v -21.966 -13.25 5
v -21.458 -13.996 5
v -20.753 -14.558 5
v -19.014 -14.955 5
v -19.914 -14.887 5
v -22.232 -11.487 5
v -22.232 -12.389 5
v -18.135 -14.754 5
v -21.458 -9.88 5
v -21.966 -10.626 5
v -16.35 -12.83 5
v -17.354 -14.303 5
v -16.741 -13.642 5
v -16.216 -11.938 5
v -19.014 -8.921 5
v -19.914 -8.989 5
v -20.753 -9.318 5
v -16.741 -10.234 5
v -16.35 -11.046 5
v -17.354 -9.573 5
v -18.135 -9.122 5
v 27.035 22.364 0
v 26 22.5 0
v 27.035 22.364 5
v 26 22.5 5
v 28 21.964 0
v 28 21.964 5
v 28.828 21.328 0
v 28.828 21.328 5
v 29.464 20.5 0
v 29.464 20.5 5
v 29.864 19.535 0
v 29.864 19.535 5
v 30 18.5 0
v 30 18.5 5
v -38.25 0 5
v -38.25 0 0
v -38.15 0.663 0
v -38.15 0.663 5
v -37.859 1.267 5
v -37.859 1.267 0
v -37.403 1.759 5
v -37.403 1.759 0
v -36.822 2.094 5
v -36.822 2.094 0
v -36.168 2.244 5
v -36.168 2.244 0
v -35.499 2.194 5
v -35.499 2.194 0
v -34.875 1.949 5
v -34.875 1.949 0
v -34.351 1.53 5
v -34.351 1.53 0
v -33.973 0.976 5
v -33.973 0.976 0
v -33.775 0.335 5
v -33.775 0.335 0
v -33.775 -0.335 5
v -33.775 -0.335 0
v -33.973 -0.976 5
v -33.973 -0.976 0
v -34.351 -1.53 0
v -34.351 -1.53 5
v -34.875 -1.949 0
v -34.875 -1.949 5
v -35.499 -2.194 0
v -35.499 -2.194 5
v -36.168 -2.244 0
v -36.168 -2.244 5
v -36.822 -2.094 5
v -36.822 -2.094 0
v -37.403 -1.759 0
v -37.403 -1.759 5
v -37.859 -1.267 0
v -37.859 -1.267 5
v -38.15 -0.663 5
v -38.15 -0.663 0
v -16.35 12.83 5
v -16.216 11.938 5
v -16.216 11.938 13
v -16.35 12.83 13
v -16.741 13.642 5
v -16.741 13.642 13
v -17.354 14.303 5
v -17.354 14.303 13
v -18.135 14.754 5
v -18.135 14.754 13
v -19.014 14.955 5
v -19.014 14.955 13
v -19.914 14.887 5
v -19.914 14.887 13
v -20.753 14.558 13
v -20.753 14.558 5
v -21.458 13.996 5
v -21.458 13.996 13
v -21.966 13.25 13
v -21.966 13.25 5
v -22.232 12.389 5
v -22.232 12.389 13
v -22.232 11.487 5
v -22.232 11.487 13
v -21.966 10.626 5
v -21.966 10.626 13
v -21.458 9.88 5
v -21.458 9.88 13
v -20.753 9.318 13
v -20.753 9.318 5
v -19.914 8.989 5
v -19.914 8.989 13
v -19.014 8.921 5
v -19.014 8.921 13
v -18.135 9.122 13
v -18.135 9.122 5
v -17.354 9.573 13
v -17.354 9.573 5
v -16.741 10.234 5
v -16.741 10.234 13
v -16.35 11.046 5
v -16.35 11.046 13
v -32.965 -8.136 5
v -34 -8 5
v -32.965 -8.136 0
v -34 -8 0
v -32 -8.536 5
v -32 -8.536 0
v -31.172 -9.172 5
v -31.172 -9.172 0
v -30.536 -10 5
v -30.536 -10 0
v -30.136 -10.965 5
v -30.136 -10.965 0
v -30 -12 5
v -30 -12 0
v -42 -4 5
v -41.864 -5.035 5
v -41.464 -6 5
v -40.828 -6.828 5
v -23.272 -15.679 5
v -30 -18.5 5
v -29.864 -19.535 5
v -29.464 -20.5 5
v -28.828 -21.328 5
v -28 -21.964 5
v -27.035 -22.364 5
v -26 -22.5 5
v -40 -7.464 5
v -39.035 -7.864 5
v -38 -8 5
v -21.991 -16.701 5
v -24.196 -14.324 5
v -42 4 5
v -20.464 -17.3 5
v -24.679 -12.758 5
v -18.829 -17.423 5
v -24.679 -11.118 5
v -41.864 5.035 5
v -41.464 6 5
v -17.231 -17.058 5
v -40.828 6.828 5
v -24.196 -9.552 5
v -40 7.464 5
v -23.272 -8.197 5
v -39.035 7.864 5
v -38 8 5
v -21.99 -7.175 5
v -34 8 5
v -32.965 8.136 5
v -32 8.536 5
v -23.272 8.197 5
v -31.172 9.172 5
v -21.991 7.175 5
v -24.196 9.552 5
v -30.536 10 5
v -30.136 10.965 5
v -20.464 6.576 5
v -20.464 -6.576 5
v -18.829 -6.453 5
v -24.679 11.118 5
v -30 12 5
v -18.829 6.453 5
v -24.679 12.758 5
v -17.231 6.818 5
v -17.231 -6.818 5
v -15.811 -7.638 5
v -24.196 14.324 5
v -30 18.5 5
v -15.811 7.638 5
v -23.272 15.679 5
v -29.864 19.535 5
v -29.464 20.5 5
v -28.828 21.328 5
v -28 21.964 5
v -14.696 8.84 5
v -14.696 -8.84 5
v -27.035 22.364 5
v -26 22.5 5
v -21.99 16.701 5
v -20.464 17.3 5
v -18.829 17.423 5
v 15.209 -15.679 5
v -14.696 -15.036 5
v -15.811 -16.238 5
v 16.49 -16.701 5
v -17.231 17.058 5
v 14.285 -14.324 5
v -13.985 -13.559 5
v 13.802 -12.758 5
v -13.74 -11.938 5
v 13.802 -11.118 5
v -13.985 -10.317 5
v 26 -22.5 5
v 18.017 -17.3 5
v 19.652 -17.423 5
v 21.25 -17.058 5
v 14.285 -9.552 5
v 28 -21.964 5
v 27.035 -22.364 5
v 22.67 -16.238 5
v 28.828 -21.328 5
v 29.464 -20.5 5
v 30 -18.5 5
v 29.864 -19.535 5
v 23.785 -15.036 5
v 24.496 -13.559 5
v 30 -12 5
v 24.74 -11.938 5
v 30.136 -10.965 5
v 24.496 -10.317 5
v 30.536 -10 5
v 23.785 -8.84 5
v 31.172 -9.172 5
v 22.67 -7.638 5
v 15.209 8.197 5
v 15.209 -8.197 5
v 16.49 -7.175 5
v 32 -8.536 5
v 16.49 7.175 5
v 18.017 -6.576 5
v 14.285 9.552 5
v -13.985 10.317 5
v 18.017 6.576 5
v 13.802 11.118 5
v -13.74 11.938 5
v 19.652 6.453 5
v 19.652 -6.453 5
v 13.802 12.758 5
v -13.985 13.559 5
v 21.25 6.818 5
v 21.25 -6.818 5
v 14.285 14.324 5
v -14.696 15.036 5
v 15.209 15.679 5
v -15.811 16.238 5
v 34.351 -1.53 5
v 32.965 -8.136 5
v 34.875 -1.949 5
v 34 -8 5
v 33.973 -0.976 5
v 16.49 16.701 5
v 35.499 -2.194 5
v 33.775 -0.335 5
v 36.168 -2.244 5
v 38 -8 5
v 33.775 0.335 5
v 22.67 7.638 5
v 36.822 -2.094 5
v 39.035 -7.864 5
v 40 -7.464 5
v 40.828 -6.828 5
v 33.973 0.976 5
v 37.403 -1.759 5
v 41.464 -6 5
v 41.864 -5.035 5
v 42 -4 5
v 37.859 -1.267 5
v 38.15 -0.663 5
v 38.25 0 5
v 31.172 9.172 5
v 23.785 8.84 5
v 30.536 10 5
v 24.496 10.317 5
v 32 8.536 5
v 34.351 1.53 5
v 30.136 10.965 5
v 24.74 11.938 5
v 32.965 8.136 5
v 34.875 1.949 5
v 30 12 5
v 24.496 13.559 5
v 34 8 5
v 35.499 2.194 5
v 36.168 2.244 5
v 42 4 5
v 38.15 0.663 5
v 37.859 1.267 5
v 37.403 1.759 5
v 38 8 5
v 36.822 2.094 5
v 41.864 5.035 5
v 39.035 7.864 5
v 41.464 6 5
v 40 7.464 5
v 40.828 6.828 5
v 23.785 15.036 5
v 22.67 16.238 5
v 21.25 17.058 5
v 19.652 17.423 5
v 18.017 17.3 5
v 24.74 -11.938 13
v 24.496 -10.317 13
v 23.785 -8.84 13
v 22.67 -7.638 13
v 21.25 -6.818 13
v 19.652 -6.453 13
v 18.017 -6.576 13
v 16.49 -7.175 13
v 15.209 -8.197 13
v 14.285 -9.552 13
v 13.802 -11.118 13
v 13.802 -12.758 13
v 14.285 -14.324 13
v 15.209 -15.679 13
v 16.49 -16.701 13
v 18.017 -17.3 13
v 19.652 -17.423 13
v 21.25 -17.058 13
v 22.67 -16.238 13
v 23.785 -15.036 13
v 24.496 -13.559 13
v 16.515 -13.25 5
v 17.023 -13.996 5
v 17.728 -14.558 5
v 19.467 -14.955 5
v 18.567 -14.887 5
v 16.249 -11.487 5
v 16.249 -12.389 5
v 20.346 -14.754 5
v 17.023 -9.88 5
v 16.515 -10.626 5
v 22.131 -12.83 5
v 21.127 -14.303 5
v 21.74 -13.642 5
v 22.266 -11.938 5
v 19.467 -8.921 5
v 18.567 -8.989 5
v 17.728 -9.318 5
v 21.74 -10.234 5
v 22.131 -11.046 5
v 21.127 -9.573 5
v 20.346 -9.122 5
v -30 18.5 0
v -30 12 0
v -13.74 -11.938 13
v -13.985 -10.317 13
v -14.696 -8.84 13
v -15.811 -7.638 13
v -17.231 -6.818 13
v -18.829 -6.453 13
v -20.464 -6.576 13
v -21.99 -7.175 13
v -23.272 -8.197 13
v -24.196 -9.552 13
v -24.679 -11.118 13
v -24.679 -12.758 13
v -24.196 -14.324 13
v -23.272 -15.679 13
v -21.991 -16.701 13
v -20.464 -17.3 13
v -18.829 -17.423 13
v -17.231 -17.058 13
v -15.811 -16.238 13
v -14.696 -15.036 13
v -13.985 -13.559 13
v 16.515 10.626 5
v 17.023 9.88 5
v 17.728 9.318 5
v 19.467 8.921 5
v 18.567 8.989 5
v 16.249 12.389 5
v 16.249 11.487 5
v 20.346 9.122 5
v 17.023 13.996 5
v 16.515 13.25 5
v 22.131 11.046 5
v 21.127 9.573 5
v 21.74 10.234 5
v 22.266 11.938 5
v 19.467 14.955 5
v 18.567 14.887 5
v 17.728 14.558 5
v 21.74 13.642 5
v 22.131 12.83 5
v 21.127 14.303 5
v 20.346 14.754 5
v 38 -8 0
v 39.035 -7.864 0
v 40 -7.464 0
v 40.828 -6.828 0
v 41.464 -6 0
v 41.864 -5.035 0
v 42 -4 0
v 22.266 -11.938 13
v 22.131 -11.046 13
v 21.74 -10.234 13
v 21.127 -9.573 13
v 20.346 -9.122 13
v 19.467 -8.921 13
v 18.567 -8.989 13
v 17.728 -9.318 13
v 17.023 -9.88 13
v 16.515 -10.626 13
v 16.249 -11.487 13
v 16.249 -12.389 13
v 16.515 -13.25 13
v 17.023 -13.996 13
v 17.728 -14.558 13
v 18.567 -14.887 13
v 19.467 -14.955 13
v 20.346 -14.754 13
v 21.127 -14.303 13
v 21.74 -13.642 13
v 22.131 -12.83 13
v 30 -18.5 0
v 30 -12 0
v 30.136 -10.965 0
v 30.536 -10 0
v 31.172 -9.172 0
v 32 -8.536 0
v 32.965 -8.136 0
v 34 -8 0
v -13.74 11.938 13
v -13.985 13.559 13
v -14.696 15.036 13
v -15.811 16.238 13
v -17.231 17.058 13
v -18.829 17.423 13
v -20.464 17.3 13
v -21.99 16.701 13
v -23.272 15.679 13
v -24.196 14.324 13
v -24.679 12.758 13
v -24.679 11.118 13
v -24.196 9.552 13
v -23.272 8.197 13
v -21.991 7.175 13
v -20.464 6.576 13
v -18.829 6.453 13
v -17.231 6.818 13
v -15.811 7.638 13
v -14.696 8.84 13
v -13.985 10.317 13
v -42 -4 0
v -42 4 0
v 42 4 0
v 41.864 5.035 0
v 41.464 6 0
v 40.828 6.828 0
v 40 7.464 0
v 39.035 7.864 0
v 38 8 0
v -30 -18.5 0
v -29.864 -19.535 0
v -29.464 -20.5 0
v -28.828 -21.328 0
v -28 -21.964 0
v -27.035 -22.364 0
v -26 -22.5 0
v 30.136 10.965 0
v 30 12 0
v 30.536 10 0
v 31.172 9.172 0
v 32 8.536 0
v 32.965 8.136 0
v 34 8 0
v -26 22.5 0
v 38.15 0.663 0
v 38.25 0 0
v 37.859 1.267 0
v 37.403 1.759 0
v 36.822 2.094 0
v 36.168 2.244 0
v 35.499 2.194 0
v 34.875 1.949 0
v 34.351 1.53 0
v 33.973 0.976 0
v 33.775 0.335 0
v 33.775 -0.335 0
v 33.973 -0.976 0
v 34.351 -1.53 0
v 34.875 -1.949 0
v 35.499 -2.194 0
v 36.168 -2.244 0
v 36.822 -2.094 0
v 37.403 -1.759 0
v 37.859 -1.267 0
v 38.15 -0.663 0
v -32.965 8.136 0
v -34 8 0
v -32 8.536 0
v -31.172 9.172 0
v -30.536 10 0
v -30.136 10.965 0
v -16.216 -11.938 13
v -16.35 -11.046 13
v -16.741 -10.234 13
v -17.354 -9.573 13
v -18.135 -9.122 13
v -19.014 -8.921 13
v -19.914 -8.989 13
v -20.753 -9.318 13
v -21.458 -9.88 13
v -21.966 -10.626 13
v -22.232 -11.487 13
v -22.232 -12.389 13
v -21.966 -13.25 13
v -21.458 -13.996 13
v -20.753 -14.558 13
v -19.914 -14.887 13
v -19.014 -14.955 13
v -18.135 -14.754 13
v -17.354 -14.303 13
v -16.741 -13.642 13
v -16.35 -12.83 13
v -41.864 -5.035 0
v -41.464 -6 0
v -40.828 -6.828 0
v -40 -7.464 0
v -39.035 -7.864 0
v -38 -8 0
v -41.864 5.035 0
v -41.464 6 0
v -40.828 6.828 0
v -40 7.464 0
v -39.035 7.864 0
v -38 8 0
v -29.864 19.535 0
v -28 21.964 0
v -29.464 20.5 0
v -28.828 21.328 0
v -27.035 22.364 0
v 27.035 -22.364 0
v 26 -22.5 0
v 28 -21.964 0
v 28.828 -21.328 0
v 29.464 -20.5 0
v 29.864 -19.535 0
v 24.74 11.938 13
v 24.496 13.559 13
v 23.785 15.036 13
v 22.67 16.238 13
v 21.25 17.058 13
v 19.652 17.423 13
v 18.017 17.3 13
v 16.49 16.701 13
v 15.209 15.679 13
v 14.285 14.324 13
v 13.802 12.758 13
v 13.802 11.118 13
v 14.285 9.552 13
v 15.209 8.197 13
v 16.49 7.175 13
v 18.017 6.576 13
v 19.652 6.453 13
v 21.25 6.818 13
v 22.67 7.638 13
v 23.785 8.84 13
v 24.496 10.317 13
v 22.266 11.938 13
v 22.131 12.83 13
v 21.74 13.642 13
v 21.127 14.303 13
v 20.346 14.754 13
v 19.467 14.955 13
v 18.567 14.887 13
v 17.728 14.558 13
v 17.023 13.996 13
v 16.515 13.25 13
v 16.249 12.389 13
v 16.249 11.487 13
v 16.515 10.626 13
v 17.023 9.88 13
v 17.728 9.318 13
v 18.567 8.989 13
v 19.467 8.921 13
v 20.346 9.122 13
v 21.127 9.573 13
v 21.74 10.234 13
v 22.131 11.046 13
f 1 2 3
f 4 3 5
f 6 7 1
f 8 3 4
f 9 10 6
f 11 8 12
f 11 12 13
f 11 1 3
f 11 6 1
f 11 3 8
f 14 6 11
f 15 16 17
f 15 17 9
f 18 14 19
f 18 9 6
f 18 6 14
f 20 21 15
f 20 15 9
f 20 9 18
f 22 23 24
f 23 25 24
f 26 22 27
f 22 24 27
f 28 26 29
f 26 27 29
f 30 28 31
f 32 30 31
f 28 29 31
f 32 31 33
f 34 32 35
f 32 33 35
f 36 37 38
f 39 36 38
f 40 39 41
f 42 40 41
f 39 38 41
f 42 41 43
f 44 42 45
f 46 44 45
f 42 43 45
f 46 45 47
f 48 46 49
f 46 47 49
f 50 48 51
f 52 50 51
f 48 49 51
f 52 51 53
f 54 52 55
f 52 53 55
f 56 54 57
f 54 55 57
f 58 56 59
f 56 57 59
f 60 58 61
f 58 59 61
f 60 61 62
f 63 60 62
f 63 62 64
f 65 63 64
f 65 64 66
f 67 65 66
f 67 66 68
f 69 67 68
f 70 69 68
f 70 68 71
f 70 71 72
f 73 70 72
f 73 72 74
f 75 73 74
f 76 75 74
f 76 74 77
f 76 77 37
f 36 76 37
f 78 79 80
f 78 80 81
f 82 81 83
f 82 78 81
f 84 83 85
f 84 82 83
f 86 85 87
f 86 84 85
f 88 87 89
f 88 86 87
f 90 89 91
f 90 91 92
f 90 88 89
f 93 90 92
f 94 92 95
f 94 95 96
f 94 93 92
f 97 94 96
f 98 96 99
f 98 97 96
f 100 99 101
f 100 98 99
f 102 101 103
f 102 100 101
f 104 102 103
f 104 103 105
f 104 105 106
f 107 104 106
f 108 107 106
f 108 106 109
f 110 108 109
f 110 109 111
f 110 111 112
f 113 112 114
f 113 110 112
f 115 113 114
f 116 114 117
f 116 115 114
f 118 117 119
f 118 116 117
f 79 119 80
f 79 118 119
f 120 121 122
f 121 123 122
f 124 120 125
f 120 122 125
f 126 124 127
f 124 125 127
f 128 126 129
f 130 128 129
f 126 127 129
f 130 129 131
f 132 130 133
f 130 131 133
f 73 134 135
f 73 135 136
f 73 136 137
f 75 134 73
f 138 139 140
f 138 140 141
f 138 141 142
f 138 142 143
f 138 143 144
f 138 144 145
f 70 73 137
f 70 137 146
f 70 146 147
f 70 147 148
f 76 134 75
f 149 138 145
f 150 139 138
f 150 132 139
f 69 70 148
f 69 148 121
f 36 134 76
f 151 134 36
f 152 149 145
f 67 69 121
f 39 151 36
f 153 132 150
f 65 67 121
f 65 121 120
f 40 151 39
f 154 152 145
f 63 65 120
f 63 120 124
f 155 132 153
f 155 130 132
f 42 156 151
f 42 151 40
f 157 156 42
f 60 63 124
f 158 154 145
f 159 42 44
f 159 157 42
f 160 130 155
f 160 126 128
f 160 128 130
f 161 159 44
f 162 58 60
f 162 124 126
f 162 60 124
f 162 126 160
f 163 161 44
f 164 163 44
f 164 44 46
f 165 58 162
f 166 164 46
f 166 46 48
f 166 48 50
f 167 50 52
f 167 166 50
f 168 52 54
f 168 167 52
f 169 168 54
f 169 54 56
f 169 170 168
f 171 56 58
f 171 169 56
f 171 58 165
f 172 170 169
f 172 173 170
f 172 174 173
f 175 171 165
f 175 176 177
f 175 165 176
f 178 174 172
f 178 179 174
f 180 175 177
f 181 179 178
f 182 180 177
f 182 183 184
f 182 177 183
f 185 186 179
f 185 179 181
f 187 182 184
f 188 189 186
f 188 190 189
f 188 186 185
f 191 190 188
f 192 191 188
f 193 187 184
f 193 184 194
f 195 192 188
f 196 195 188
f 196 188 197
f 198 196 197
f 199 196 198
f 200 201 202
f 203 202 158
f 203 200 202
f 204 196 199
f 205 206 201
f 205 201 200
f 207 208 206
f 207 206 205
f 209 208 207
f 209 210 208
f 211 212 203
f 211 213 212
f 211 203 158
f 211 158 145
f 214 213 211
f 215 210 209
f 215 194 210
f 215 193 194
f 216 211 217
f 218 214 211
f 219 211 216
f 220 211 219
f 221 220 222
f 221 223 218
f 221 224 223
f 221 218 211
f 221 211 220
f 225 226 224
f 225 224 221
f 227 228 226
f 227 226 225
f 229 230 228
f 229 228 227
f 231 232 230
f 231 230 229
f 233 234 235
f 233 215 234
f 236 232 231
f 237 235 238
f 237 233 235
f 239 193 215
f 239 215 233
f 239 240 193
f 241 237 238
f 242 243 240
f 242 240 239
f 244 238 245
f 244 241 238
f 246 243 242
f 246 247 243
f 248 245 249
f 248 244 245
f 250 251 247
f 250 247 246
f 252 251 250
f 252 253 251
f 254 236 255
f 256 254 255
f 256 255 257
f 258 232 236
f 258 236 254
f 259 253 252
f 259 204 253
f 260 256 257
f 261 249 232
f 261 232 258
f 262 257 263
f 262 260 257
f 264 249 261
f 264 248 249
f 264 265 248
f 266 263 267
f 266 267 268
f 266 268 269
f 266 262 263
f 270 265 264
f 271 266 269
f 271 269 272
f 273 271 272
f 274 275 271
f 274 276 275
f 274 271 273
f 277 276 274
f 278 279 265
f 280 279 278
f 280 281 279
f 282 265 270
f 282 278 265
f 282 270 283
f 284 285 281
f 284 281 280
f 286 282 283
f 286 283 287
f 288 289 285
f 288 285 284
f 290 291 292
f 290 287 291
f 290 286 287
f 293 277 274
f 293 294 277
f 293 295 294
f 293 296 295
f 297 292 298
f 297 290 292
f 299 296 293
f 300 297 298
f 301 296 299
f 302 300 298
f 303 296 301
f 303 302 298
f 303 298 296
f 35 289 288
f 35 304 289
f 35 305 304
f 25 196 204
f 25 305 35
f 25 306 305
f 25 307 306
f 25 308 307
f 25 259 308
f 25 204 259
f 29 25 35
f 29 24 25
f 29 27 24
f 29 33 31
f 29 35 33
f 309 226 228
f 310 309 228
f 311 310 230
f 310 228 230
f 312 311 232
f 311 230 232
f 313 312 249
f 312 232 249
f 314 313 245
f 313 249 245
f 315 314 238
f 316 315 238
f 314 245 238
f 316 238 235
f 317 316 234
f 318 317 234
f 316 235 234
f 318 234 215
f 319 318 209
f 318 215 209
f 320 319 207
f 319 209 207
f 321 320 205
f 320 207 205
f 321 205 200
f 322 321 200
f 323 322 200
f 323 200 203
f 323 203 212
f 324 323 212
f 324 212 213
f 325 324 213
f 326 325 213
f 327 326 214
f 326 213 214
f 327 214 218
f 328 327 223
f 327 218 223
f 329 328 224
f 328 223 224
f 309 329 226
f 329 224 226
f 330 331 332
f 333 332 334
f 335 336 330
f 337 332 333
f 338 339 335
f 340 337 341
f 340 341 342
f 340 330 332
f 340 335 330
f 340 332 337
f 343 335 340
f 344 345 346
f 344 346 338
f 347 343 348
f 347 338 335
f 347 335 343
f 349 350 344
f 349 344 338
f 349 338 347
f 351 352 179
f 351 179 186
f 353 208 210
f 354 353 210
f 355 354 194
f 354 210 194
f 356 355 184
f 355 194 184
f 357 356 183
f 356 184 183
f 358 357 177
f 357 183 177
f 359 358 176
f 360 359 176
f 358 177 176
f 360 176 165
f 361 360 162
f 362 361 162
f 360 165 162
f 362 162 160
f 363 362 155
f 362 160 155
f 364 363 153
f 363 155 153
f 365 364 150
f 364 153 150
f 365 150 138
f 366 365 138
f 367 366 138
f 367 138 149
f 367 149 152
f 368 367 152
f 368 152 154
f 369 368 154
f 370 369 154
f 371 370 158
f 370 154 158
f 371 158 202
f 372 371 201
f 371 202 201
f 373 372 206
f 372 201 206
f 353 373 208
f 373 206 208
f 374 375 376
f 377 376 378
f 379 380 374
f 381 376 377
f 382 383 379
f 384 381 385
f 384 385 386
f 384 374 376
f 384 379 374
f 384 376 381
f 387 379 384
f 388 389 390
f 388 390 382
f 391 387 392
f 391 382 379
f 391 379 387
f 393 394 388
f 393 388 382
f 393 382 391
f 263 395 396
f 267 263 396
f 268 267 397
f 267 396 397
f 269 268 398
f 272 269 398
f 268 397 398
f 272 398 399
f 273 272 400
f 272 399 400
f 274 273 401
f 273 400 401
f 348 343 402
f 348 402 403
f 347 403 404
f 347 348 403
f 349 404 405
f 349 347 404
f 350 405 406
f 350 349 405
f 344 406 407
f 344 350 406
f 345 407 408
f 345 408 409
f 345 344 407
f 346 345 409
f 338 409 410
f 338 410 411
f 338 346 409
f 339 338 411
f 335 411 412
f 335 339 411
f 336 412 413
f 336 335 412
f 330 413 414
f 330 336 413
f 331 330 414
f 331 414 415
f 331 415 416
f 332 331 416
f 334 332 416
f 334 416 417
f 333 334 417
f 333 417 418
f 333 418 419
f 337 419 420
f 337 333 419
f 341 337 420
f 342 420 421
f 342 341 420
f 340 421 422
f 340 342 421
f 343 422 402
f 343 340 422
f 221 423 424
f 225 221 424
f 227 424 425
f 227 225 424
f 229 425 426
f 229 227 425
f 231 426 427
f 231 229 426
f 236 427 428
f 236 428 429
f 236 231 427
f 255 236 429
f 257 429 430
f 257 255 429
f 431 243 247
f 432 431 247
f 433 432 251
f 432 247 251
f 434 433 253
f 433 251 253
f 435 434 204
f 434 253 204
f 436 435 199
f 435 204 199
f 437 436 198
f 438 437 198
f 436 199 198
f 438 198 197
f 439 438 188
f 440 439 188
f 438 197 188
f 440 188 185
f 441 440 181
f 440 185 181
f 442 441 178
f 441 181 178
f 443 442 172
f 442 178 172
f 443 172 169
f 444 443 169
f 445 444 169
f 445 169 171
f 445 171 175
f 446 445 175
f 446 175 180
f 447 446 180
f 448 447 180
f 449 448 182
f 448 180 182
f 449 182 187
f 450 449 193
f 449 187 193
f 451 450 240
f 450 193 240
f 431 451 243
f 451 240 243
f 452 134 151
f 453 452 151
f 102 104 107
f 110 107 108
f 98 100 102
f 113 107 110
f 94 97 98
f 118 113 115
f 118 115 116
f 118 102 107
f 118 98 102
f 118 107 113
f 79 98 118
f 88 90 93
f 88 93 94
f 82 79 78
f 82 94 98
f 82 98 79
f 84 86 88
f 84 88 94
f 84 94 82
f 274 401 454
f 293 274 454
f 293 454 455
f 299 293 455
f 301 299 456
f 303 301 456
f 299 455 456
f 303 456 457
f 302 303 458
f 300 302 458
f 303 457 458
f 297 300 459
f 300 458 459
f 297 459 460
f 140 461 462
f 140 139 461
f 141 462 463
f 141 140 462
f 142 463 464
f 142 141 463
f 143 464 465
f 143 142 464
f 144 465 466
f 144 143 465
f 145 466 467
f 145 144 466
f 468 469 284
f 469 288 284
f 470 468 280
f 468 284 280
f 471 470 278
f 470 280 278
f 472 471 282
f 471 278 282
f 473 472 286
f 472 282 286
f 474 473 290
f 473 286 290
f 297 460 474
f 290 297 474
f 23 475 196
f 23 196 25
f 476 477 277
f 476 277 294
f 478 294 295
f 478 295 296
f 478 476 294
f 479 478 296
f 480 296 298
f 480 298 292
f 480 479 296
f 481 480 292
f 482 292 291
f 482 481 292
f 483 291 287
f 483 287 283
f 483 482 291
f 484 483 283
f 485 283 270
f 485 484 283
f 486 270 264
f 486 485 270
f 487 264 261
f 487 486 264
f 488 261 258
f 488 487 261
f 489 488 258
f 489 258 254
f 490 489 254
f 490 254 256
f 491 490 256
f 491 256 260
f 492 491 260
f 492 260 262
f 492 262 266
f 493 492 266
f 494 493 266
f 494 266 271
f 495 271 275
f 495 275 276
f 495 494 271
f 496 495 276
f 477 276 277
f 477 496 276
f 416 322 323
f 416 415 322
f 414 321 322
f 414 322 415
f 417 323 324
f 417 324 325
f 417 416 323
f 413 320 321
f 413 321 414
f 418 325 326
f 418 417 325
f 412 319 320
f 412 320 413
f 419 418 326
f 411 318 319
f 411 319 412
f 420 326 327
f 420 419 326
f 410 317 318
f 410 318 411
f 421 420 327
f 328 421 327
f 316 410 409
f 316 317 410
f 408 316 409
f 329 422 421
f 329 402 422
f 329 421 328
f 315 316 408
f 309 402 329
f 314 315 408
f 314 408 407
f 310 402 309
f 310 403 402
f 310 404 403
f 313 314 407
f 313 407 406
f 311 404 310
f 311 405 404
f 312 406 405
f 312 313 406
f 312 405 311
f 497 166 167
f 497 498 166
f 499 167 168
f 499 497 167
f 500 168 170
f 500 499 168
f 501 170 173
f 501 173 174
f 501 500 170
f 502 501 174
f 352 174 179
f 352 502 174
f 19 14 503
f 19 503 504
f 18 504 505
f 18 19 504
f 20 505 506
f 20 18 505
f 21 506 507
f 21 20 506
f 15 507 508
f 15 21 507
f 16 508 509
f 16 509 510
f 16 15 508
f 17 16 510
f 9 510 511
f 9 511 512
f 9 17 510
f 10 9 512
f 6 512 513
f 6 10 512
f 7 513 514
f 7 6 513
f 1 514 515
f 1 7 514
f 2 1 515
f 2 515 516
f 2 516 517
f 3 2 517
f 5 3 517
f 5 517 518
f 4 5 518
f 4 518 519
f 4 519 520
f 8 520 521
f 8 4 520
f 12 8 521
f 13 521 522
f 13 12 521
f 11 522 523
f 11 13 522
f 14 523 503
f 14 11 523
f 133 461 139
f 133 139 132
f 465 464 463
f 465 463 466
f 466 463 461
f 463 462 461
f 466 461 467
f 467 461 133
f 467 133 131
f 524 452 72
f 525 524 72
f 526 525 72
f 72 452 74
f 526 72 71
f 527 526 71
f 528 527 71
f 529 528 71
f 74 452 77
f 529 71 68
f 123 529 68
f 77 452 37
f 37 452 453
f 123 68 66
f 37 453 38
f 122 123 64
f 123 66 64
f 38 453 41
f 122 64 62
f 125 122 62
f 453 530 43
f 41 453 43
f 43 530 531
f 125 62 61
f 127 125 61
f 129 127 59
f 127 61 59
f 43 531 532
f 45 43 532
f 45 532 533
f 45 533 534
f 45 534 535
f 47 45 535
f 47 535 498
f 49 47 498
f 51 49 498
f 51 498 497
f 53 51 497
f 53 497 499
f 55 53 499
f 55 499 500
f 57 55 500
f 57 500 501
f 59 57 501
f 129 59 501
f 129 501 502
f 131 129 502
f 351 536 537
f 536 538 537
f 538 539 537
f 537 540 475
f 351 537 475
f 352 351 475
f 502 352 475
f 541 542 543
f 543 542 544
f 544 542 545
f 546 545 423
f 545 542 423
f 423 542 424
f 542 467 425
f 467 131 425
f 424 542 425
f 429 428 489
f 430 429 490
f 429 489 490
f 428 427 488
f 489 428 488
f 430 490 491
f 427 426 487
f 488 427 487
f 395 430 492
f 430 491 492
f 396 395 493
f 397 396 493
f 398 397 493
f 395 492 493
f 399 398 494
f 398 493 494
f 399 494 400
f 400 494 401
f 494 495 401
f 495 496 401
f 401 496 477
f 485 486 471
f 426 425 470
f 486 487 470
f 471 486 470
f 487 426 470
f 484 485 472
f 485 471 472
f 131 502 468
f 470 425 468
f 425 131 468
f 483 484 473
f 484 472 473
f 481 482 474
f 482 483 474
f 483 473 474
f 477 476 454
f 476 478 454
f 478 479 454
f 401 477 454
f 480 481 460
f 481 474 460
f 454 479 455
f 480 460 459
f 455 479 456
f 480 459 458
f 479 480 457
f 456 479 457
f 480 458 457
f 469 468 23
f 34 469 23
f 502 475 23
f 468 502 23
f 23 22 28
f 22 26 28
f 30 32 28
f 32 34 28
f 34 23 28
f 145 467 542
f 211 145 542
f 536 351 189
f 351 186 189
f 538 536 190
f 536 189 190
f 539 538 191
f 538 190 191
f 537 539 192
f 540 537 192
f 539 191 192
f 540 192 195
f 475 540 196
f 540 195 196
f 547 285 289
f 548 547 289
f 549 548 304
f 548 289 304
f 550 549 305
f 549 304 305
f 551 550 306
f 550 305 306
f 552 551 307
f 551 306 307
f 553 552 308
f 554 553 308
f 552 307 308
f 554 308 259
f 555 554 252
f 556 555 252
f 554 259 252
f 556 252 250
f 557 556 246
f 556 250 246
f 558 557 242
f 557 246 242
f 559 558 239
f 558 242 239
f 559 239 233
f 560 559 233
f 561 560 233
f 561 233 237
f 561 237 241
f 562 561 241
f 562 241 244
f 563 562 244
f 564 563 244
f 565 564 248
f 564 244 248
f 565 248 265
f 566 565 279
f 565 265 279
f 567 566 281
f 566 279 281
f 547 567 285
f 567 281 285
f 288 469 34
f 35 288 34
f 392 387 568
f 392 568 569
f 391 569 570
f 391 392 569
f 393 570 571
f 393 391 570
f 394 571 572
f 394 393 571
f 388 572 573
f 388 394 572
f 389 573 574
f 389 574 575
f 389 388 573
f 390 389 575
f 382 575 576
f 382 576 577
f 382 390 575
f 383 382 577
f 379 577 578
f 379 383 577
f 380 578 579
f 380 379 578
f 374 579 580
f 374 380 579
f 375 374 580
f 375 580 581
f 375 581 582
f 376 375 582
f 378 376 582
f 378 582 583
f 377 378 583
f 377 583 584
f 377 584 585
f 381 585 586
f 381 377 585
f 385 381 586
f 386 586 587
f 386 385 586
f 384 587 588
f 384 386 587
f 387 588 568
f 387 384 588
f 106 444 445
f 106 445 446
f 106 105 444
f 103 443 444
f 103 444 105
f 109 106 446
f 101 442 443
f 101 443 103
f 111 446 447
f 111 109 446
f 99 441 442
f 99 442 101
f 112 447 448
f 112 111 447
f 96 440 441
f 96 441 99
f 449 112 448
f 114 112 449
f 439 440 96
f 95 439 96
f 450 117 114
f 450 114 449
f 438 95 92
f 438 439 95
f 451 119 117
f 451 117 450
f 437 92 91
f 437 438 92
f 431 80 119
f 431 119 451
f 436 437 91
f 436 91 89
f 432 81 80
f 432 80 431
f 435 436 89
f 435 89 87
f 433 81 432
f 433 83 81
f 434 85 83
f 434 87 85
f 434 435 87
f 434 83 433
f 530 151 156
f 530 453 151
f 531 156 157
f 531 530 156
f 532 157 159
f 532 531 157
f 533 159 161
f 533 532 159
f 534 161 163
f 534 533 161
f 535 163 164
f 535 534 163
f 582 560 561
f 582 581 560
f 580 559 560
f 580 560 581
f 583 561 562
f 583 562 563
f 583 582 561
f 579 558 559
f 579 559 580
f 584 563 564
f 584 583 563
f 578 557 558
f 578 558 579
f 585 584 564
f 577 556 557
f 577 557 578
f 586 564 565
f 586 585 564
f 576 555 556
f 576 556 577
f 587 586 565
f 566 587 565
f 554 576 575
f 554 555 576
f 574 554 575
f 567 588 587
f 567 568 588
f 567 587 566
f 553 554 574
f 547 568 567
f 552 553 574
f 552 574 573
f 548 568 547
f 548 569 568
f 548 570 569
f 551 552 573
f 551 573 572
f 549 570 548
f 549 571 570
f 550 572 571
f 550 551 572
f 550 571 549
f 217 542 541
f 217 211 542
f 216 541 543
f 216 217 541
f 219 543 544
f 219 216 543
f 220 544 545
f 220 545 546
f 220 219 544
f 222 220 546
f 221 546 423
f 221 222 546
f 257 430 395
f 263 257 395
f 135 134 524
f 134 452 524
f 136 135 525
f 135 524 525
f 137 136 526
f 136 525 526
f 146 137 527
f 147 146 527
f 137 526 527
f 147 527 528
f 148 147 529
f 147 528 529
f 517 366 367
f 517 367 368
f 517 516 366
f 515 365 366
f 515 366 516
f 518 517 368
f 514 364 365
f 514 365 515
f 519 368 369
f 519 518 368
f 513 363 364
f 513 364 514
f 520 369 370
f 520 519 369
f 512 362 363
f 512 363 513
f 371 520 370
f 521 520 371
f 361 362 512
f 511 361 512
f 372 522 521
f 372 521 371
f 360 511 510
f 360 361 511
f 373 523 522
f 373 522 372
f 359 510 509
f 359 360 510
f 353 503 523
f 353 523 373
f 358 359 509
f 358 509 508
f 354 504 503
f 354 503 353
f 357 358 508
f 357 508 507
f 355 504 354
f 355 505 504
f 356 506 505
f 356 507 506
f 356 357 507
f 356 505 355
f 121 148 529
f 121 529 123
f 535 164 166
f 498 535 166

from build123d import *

# Parameters (mm, degrees)
SKETCH1_W            = 60
SKETCH1_H            = 45
BOSS_EXTRUDE1_DEPTH  = 5
SKETCH3_R            = 5.5
SKETCH3_R_2          = 3.025
BOSS_EXTRUDE2_DEPTH  = 8
SKETCH4_W            = 12
SKETCH4_H            = 16
SKETCH4_R            = 2.55
BOSS_EXTRUDE3_DEPTH  = 5
FILLET1_R            = 4
M4_CLEARANCE_HOLE1_D = 4.5
MIRROR1_OUTLINE_R    = 2.25
MIRROR1_DEPTH        = 5
FILLET2_R            = 4


# Read off the part's stored shape, not the designer's step: Mirror1
with BuildPart() as part:
    # Sketch1 → Boss-Extrude1 (new body)
    with BuildSketch(Plane.XY):
        Rectangle(SKETCH1_W, SKETCH1_H)
    extrude(amount=BOSS_EXTRUDE1_DEPTH)

    # Sketch3 → Boss-Extrude2 (add)
    # profile 1 of 4: a face of its own
    with BuildSketch(Plane.XY.offset(5)):
        with Locations((-19.2405, 11.938)):
            Circle(SKETCH3_R)
        with Locations((-19.2405, 11.938)):
            Circle(SKETCH3_R_2, mode=Mode.SUBTRACT)
    # profile 2 of 4: a face of its own
    with BuildSketch(Plane.XY.offset(5)):
        with Locations((-19.2405, -11.938)):
            Circle(SKETCH3_R)
        with Locations((-19.2405, -11.938)):
            Circle(SKETCH3_R_2, mode=Mode.SUBTRACT)
    # profile 3 of 4: a face of its own
    with BuildSketch(Plane.XY.offset(5)):
        with Locations((19.2405, 11.938)):
            Circle(SKETCH3_R)
        with Locations((19.2405, 11.938)):
            Circle(SKETCH3_R_2, mode=Mode.SUBTRACT)
    # profile 4 of 4: a face of its own
    with BuildSketch(Plane.XY.offset(5)):
        with Locations((19.2405, -11.938)):
            Circle(SKETCH3_R)
        with Locations((19.2405, -11.938)):
            Circle(SKETCH3_R_2, mode=Mode.SUBTRACT)
    extrude(amount=BOSS_EXTRUDE2_DEPTH)

    # Sketch4 → Boss-Extrude3 (add)
    # profile 1 of 2: a face of its own
    with BuildSketch(Plane.XY.offset(5)):
        with Locations((-36, 0)):
            Rectangle(SKETCH4_W, SKETCH4_H)
        with Locations((-36, 0)):
            Circle(SKETCH4_R, mode=Mode.SUBTRACT)
    # profile 2 of 2: a face of its own
    with BuildSketch(Plane.XY.offset(5)):
        with Locations((-36, 0)):
            Circle(SKETCH4_R)
    extrude(amount=-BOSS_EXTRUDE3_DEPTH)

    # Fillet1
    fillet1_edges = [part.edges().sort_by_distance(p)[0] for p in [
        (-42, -8, 2.5),
        (-42, 8, 2.5),
        (-30, 8, 2.5),
        (-30, -8, 2.5),
        (-30, 22.5, 2.5),
        (-30, -22.5, 2.5),
    ]]
    fillet(fillet1_edges, radius=FILLET1_R)

    # M4 Clearance Hole1 (through all)
    with Locations(Plane.XY.offset(5)):
        with Locations((-36, 0)):
            Hole(M4_CLEARANCE_HOLE1_D / 2)

    # Mirror1 outline → Mirror1 (add)
    with BuildSketch(Plane.XY):
        with BuildLine():
            ThreePointArc((42, 4), (40.828427125, 6.828427125), (38, 8))
            Line((38, 8), (30, 8))
            Line((30, 8), (30, -8))
            Line((30, -8), (38, -8))
            ThreePointArc((38, -8), (40.828427125, -6.828427125), (42, -4))
            Line((42, -4), (42, 4))
        make_face()
        with Locations((36, 0)):
            Circle(MIRROR1_OUTLINE_R, mode=Mode.SUBTRACT)
    extrude(amount=MIRROR1_DEPTH)

    # Fillet2
    fillet2_edges = [part.edges().sort_by_distance(p)[0] for p in [
        (30, -8, 2.5),
        (30, 8, 2.5),
        (30, 22.5, 2.5),
        (30, -22.5, 2.5),
    ]]
    fillet(fillet2_edges, radius=FILLET2_R)


solid = part.part
